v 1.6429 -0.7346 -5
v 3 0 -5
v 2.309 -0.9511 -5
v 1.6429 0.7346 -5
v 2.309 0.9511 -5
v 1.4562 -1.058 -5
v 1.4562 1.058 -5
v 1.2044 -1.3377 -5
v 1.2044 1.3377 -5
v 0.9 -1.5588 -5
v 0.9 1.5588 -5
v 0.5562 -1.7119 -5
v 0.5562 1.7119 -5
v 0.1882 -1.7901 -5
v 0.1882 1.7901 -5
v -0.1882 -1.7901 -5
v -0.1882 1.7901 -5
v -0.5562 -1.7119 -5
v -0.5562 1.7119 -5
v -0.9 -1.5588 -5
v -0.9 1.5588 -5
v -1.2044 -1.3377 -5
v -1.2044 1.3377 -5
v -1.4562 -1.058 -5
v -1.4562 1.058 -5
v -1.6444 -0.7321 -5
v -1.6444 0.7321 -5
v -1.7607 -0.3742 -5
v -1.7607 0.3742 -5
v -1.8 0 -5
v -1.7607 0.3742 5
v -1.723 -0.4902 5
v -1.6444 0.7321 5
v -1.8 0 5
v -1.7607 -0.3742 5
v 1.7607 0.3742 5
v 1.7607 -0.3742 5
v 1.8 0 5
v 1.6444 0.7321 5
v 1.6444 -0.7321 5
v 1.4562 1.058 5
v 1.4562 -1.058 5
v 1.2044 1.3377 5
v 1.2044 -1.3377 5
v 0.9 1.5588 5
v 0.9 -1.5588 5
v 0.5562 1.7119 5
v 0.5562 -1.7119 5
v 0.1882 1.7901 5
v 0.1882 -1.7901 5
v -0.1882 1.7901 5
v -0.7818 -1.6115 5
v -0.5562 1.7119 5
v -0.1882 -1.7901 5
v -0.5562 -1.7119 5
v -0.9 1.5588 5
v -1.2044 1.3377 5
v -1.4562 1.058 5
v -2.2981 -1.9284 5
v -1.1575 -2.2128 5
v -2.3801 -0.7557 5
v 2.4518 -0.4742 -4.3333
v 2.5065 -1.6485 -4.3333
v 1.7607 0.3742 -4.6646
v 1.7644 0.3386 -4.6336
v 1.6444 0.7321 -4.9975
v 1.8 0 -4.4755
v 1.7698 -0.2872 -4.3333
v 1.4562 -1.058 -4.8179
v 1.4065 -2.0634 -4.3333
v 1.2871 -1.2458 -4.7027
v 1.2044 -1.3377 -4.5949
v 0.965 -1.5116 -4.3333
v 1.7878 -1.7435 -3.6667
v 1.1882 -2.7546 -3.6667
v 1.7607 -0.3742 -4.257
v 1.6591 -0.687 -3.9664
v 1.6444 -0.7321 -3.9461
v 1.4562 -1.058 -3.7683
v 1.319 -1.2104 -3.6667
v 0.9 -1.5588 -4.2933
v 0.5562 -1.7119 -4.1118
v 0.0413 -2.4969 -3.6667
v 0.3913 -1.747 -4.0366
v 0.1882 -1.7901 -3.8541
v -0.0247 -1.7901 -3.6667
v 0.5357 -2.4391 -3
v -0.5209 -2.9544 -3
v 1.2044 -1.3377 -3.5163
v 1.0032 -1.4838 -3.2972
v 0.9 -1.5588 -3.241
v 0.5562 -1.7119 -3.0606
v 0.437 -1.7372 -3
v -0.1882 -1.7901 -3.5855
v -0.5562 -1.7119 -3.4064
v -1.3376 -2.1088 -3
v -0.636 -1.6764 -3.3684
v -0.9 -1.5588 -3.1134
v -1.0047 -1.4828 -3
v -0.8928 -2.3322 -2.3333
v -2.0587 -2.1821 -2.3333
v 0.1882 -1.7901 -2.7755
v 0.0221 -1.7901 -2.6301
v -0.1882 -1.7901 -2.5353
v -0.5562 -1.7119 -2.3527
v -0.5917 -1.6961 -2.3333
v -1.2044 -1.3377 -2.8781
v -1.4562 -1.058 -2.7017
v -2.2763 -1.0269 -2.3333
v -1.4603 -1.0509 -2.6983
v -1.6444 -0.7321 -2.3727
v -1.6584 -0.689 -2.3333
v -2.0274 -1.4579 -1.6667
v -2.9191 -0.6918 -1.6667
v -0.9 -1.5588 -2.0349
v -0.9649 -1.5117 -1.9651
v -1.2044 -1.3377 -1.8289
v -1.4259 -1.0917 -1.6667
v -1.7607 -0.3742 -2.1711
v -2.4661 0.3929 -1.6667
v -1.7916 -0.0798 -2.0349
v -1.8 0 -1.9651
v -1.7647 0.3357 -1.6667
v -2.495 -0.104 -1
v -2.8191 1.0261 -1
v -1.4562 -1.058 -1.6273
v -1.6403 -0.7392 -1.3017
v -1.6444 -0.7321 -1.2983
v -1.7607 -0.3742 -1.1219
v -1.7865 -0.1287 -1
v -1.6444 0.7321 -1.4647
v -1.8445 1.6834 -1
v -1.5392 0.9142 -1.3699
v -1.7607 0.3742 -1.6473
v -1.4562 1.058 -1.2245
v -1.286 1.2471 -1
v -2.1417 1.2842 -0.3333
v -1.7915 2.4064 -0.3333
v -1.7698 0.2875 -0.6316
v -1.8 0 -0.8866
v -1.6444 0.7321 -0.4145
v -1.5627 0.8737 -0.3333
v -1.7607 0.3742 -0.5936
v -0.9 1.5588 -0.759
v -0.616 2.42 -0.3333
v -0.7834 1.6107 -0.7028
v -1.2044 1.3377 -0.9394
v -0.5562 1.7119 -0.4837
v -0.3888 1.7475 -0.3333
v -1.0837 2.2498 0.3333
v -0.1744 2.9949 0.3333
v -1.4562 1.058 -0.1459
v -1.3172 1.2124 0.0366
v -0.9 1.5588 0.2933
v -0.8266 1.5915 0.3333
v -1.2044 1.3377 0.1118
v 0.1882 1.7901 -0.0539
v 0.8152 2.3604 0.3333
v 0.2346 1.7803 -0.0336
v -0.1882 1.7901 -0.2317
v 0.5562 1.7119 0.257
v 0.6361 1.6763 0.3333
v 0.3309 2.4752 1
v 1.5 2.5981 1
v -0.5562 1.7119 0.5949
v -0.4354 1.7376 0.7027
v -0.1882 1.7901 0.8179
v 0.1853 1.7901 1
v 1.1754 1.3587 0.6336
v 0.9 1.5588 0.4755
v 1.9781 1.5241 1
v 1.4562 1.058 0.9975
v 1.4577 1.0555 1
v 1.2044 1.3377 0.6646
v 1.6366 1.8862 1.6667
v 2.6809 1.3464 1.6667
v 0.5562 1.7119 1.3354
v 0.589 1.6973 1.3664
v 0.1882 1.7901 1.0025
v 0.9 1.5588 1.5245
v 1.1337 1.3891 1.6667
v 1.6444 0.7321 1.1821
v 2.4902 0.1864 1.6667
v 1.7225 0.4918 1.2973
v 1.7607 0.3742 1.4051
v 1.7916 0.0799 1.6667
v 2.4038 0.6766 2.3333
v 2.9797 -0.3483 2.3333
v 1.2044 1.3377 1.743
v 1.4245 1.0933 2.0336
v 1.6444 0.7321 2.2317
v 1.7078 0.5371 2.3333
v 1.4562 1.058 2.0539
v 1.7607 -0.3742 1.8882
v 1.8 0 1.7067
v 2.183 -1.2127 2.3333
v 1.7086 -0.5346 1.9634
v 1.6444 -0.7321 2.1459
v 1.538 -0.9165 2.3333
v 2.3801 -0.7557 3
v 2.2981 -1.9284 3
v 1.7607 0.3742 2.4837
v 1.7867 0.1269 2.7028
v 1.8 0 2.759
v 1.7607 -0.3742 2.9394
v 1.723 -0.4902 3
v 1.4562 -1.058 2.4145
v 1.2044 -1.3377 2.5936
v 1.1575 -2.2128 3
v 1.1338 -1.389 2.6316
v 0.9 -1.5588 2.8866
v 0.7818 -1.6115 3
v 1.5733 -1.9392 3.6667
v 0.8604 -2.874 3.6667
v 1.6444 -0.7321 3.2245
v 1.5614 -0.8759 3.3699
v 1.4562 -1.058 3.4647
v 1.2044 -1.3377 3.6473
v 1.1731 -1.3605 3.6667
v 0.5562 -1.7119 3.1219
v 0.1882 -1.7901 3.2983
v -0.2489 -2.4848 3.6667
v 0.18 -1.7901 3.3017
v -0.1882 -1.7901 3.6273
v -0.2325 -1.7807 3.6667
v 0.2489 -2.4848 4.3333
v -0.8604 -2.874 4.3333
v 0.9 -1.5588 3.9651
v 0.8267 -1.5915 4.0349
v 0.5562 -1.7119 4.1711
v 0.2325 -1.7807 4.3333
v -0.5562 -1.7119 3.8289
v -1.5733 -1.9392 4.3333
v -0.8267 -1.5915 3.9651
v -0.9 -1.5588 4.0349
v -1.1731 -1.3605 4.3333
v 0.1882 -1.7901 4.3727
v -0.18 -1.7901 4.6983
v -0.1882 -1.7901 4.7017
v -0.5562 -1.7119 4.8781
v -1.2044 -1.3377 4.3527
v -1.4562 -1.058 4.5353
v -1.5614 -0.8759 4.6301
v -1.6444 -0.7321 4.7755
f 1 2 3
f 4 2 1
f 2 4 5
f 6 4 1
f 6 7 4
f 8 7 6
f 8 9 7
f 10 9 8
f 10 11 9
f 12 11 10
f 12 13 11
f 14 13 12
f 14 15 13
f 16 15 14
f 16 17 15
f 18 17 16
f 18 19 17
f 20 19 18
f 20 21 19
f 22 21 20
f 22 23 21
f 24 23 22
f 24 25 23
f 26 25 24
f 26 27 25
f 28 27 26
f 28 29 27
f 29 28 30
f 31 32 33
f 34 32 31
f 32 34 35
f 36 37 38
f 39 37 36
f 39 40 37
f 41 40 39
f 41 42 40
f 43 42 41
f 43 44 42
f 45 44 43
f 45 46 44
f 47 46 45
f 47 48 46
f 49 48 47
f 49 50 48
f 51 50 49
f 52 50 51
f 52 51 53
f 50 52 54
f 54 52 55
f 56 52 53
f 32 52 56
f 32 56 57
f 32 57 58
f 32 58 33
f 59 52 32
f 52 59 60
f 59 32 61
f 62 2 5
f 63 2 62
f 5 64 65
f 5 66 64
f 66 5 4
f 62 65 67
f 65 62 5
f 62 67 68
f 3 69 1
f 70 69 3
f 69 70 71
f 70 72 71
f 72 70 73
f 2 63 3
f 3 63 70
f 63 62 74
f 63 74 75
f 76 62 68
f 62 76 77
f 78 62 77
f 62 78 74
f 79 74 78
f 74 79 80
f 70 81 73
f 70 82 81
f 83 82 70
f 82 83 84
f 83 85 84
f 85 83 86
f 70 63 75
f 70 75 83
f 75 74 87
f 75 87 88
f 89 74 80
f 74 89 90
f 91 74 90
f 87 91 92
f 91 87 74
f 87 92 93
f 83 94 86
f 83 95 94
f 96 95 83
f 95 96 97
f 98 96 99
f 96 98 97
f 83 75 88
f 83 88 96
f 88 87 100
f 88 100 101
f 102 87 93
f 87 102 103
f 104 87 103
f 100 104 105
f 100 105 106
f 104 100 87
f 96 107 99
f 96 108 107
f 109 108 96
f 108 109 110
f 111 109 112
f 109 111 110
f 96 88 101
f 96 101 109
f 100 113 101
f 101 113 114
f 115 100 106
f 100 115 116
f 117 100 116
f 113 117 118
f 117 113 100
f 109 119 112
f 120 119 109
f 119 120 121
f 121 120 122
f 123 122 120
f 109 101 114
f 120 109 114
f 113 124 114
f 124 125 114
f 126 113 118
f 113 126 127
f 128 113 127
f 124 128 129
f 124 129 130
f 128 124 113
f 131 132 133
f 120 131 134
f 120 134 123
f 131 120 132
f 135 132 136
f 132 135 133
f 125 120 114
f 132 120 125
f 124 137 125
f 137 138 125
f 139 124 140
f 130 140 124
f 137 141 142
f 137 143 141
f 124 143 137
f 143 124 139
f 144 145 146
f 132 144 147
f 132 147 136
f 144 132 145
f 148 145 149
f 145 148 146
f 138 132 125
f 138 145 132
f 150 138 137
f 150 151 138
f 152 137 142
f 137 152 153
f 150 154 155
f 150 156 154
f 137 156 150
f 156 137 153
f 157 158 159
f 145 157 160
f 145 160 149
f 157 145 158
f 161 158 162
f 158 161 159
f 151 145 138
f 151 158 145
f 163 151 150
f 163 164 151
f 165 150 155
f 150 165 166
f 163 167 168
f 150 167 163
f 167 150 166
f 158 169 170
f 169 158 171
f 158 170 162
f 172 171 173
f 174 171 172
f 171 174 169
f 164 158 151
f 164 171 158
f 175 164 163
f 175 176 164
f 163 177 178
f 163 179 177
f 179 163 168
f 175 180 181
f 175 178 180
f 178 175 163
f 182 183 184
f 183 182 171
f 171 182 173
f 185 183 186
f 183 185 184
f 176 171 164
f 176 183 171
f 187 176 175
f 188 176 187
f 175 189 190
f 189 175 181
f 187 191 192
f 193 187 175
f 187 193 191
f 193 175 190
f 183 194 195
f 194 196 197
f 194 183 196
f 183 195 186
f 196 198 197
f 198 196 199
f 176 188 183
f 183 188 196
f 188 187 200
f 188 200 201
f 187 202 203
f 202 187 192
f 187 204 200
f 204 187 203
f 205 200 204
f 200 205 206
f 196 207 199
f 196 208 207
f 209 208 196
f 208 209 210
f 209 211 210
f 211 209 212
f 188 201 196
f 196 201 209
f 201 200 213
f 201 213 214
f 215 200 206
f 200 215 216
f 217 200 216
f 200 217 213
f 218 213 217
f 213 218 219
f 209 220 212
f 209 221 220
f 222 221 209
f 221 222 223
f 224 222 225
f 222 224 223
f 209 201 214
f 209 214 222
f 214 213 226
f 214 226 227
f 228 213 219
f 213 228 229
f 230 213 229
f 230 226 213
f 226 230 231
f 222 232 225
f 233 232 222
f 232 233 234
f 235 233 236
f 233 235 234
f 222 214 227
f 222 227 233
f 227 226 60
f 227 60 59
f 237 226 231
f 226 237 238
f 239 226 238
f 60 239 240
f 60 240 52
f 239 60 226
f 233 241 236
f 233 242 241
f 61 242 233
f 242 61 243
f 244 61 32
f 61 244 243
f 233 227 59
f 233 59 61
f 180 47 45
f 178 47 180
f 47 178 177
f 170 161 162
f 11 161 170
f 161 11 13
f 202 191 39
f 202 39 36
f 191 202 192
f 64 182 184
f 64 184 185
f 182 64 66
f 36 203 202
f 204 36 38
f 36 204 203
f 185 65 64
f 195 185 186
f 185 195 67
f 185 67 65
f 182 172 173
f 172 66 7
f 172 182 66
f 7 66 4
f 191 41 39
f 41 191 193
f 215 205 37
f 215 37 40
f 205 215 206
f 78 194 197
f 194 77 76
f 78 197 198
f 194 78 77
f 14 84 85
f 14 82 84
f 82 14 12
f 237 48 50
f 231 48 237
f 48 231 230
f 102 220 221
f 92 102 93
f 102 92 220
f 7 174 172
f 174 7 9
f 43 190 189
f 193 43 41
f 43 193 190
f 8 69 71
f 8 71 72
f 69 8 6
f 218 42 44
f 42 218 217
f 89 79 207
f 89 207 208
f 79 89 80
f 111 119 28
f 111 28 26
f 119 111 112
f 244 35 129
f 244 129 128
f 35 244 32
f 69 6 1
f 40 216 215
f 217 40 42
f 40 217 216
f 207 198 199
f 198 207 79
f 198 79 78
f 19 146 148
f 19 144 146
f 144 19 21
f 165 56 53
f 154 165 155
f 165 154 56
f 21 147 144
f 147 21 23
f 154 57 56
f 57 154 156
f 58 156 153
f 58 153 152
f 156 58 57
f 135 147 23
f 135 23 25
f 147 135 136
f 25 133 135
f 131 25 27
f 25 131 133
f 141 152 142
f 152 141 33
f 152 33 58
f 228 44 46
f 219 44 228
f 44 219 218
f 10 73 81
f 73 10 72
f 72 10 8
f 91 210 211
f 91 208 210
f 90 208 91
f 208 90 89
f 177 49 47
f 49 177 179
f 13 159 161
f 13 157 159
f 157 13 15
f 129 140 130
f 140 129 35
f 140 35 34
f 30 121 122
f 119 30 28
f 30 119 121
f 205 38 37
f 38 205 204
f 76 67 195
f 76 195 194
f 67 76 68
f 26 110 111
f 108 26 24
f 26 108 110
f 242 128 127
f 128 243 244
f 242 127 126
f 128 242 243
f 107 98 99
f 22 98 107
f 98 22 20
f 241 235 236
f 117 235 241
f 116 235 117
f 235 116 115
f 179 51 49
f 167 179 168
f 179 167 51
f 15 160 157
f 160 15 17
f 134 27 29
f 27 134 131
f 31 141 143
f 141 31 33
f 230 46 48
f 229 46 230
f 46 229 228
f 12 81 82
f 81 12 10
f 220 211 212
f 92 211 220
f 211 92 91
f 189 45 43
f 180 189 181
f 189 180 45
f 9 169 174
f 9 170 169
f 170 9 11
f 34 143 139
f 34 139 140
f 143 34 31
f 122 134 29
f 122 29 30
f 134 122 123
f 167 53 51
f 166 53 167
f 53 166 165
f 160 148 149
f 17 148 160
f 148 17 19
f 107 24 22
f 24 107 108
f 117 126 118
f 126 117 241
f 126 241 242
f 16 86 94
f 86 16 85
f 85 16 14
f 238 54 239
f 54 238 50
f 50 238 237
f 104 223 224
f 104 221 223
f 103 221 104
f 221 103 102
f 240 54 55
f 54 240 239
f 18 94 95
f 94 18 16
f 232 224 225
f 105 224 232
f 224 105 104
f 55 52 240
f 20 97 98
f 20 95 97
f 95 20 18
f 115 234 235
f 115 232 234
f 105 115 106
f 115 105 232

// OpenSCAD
//Corkscrew Extrude

linear_extrude(height = 10, center = true, convexity = 10, twist = 500)
translate([2, 0, 0])
circle(r = 1);

translate([0, 0, -5]) cylinder(r  = 1.8, h = 10, $fn = 30);
